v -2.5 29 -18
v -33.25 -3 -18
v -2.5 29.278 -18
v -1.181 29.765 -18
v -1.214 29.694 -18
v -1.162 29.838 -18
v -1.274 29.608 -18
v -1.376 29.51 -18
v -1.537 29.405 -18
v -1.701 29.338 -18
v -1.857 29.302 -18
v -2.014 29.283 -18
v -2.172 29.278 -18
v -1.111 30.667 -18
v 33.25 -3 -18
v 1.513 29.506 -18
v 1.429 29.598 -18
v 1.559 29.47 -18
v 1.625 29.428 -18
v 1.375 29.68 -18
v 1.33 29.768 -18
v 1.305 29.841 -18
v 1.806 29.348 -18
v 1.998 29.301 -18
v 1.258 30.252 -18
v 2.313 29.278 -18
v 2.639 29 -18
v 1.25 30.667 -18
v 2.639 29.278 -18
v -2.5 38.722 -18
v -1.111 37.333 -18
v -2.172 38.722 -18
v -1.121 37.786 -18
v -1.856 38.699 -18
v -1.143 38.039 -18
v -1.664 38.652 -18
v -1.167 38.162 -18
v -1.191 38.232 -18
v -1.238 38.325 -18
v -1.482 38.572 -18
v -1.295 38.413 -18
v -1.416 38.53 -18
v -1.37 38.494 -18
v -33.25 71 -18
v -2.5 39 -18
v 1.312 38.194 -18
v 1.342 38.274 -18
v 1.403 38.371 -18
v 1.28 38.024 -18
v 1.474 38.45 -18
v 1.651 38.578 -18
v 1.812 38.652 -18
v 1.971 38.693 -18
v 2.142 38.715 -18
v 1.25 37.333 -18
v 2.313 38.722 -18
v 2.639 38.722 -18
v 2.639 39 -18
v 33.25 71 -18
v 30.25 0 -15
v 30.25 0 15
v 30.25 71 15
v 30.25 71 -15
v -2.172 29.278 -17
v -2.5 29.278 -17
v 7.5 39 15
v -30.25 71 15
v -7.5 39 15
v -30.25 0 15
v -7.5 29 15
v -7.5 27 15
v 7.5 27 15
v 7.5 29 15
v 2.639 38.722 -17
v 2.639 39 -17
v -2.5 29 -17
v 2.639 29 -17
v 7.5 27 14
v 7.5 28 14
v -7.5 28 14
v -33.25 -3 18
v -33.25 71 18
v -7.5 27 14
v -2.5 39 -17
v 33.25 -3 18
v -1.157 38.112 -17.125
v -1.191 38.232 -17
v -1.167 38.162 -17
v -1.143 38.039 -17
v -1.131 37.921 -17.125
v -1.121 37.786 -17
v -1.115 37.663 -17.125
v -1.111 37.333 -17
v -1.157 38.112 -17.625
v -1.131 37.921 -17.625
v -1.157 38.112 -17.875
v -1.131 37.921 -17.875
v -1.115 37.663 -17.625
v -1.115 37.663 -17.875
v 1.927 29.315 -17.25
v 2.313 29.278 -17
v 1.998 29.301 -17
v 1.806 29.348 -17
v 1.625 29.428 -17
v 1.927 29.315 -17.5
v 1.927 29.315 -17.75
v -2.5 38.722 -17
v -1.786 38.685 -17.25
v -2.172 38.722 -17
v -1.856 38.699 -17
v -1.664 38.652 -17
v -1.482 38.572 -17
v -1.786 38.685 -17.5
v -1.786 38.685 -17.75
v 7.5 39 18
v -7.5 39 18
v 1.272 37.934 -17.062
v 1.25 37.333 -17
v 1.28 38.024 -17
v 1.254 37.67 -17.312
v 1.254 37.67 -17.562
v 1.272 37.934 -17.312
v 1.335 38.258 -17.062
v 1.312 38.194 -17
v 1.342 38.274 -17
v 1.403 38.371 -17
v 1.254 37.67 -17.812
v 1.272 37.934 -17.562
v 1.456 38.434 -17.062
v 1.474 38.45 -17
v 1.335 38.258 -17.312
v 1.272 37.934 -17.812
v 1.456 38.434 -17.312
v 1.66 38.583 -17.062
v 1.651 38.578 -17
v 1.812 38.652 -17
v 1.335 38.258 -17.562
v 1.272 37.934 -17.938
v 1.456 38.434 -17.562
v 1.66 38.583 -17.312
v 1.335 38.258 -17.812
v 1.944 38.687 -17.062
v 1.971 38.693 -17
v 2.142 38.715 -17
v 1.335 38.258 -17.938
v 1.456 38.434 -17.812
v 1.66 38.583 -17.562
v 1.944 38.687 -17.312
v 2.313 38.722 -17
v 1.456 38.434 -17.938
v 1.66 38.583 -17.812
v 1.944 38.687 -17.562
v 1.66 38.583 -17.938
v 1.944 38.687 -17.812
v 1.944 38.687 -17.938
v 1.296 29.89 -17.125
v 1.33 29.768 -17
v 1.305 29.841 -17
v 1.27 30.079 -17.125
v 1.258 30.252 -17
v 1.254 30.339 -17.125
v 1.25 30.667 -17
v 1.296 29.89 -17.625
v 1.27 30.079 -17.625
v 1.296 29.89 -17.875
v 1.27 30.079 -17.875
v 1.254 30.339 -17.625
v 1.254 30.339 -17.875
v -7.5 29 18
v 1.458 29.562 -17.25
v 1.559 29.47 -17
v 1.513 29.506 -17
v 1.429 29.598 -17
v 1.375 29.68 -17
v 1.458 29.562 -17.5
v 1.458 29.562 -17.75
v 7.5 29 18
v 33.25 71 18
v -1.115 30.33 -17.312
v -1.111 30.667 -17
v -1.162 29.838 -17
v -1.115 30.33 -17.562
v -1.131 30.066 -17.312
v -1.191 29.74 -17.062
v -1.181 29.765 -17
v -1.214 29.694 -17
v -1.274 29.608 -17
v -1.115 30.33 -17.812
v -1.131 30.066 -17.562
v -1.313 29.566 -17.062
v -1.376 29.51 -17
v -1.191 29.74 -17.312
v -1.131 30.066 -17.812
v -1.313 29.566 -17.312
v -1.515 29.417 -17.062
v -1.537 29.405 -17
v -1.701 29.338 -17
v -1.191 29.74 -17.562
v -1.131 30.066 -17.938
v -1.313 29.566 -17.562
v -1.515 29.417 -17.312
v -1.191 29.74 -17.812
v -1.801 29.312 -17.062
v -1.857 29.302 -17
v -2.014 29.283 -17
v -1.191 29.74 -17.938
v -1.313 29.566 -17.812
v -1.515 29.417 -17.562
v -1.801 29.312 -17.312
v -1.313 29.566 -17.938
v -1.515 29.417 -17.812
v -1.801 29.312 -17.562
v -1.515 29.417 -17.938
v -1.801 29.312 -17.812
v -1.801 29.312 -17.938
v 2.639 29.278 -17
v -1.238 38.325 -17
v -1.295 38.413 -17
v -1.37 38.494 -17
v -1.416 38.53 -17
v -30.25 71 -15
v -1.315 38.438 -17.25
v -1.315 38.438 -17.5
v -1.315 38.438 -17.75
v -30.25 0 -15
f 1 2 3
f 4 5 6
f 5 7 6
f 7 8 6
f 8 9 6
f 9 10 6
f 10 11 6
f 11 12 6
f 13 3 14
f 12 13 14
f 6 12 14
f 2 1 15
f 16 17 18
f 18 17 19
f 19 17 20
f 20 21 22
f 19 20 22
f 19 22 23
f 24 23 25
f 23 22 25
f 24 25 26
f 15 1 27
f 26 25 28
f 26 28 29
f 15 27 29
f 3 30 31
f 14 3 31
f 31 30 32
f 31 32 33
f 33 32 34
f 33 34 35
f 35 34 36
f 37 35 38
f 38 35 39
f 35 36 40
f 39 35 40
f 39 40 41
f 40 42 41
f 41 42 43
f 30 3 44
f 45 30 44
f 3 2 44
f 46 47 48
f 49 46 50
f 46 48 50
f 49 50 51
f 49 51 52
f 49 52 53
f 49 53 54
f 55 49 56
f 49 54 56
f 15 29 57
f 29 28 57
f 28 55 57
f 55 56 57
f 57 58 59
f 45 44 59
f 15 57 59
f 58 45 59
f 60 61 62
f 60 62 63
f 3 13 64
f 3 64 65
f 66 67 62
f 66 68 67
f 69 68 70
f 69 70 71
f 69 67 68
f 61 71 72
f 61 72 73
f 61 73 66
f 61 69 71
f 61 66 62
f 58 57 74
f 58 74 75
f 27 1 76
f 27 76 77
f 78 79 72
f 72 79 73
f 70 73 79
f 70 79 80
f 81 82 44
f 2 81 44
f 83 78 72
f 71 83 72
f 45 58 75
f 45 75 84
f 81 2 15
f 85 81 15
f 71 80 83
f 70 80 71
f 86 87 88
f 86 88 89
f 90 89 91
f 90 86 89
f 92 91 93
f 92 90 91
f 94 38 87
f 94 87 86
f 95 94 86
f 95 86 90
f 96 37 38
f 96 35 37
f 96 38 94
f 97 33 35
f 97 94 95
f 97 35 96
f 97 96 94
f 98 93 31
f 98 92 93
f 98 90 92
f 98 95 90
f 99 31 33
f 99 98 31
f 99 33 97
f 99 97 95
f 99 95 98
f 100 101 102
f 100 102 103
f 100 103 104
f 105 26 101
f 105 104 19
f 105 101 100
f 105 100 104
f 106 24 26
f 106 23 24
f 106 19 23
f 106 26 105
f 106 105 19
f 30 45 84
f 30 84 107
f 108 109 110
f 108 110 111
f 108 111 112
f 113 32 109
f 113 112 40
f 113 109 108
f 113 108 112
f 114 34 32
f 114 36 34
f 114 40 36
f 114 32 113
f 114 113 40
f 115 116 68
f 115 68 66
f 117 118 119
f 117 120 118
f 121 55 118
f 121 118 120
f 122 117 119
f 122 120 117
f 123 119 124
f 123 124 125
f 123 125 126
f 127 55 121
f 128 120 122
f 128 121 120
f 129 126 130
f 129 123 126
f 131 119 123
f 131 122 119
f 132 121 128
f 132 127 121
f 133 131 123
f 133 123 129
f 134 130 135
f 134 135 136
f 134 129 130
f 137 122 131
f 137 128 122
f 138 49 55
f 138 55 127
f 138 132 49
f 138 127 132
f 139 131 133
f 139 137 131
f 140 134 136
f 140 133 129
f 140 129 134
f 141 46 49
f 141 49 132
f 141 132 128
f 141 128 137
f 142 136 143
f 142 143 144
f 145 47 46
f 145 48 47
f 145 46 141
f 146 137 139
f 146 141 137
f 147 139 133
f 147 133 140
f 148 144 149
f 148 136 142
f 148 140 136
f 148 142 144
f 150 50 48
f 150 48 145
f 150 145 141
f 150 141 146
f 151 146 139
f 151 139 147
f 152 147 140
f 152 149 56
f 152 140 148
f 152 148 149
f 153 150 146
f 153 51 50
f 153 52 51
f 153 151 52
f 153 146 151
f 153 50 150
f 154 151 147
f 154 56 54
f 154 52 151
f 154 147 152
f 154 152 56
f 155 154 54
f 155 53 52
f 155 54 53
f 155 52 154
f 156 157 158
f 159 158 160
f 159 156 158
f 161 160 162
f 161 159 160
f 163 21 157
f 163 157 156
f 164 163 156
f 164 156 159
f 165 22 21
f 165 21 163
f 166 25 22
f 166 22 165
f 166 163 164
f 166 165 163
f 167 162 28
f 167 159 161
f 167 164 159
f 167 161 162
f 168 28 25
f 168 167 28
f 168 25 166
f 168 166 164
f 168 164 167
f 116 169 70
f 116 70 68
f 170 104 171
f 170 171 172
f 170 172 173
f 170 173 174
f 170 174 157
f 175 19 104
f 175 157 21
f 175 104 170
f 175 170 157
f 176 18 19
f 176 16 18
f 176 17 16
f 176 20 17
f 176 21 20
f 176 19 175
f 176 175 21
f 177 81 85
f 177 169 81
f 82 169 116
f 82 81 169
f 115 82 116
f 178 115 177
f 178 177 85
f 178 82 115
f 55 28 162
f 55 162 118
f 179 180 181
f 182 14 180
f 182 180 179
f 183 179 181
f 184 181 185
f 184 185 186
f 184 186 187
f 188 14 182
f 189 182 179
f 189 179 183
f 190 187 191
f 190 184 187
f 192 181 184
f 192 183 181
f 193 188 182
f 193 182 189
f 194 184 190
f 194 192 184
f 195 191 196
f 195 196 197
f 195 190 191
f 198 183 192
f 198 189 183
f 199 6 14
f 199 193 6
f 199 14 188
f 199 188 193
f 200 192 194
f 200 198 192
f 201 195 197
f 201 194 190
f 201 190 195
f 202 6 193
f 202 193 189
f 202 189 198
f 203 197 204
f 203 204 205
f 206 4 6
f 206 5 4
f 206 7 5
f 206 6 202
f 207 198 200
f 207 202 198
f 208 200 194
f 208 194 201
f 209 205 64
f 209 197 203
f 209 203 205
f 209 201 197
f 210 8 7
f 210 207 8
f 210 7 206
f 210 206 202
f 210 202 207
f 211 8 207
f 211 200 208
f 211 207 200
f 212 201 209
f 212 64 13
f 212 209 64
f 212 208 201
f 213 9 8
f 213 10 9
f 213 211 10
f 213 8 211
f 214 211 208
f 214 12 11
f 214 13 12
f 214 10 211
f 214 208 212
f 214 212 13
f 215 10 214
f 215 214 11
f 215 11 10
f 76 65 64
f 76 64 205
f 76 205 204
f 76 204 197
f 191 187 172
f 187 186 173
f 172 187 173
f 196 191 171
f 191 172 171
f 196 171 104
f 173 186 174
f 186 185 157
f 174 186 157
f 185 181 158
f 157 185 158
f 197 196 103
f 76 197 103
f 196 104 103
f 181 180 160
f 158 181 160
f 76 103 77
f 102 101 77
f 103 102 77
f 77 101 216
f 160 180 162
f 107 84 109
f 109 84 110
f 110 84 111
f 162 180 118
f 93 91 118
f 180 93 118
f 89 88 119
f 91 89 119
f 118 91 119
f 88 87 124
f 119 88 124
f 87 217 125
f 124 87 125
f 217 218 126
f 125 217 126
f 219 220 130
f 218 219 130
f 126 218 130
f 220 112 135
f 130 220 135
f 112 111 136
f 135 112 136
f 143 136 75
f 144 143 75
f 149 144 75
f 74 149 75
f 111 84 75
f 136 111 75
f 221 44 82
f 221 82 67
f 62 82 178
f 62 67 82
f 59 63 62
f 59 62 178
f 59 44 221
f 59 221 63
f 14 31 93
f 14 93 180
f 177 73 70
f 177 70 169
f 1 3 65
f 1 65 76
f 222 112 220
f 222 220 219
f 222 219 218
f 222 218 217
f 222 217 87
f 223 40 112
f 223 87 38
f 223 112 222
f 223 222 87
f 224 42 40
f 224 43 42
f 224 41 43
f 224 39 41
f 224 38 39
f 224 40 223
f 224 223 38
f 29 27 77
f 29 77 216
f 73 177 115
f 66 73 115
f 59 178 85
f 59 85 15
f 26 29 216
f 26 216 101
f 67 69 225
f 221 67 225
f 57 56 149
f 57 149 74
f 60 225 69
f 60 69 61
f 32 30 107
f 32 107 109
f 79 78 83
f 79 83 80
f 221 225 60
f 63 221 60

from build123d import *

# Parameters (mm, degrees)
SKETCH1_W           = 66.5
SKETCH1_H           = 36
SKETCH1_W_2         = 60.5
SKETCH1_H_2         = 30
BOSS_EXTRUDE1_DEPTH = 71
SKETCH1_3_W         = 66.5
SKETCH1_3_H         = 36
SKETCH1_3_W_2       = 60.5
SKETCH1_3_H_2       = 30
BOSS_EXTRUDE2_DEPTH = 3
CUT_EXTRUDE1_REACH  = 88.27
SKETCH2_W           = 15
SKETCH2_H           = 10
SKETCH4_W           = 1
SKETCH4_H           = 2
BOSS_EXTRUDE4_DEPTH = 15
CHAMFER1_SIZE       = 1
CUT_EXTRUDE2_DEPTH  = 1


with BuildPart() as part:
    # Sketch1 → Boss-Extrude1 (new body)
    with BuildSketch(Plane(origin=(0, 0, 0), x_dir=(1, 0, 0), z_dir=(0, 1, 0))):
        Rectangle(SKETCH1_W, SKETCH1_H)
        Rectangle(SKETCH1_W_2, SKETCH1_H_2, mode=Mode.SUBTRACT)
    extrude(amount=BOSS_EXTRUDE1_DEPTH)

    # Sketch1<3> → Boss-Extrude2 (add)
    with BuildSketch(Plane(origin=(0, 0, 0), x_dir=(1, 0, 0), z_dir=(0, 1, 0))):
        Rectangle(SKETCH1_3_W, SKETCH1_3_H)
        Rectangle(SKETCH1_3_W_2, SKETCH1_3_H_2, mode=Mode.SUBTRACT)
        Rectangle(SKETCH1_3_W_2, SKETCH1_3_H_2)
    extrude(amount=-BOSS_EXTRUDE2_DEPTH)

    # Sketch2 → Cut-Extrude1 (cut, up to next)
    with BuildSketch(Plane.XY.offset(18), mode=Mode.PRIVATE) as cut_extrude1_sk1:
        with Locations((0, 34)):
            Rectangle(SKETCH2_W, SKETCH2_H)
    cut_extrude1_tool1 = extrude(cut_extrude1_sk1.sketch, amount=-CUT_EXTRUDE1_REACH, mode=Mode.PRIVATE) & part.part
    add(cut_extrude1_tool1.solids().sort_by_distance((0, 34, 18))[0], mode=Mode.SUBTRACT)

    # Sketch4 → Boss-Extrude4 (add)
    with BuildSketch(Plane.ZY.offset(-7.5)):
        with Locations((14.5, 28)):
            Rectangle(SKETCH4_W, SKETCH4_H)
    extrude(amount=BOSS_EXTRUDE4_DEPTH)

    # Chamfer1
    chamfer1_edges = [part.edges().sort_by_distance(p)[0] for p in [
        (0, 29, 14),
    ]]
    chamfer(chamfer1_edges, length=CHAMFER1_SIZE)

    # Sketch5 → Cut-Extrude2 (cut)
    with BuildSketch(Plane(origin=(0, 0, -18), x_dir=(-1, 0, 0), z_dir=(0, 0, -1))):
        with BuildLine():
            Line((-2.638888889, 38.722222222), (-2.638888889, 39))
            Line((-2.638888889, 39), (2.5, 39))
            Line((2.5, 39), (2.5, 38.722222222))
            Line((2.5, 38.722222222), (2.172309028, 38.722222222))
            add(Edge.make_bspline(
                [(2.172309028, 38.722222222), (2.104184293, 38.720949678), (1.974513104, 38.718527469), (1.790231692, 38.689739833), (1.625736646, 38.644148981), (1.528628421, 38.595662221), (1.482204861, 38.572482639)],
                knots=[0, 0, 0, 0, 1.144467932, 2.17842344, 3.129177061, 4, 4, 4, 4], degree=3))
            add(Edge.make_bspline(
                [(1.482204861, 38.572482639), (1.451706337, 38.554084379), (1.390014843, 38.516868933), (1.310783803, 38.438036518), (1.243641581, 38.341940776), (1.209171954, 38.269240619), (1.19140625, 38.231770833)],
                knots=[0, 0, 0, 0, 0.93343552, 1.888125192, 2.911536119, 4, 4, 4, 4], degree=3))
            add(Edge.make_bspline(
                [(1.19140625, 38.231770833), (1.184350586, 38.214575185), (1.16854678, 38.176059078), (1.15557603, 38.106048651), (1.139091299, 38.020392262), (1.129876754, 37.915742203), (1.121221924, 37.794954741), (1.114101268, 37.656759716), (1.113522404, 37.501150705), (1.111942587, 37.391201064), (1.111111111, 37.333333333)],
                knots=[0, 0, 0, 0, 0.491143652, 1.100100526, 1.878201893, 2.802922625, 3.87869145, 5.087223688, 6.466973141, 8, 8, 8, 8], degree=3))
            Line((1.111111111, 37.333333333), (1.111111111, 30.666666667))
            add(Edge.make_bspline(
                [(1.111111111, 30.666666667), (1.111939588, 30.608075204), (1.113524957, 30.495954931), (1.114136618, 30.336734675), (1.121108982, 30.194912102), (1.130079845, 30.070534861), (1.138829557, 29.962956044), (1.156182735, 29.873070769), (1.16828298, 29.799419433), (1.195529243, 29.72563882), (1.240143315, 29.646586055), (1.312990851, 29.562040058), (1.405657276, 29.483796342), (1.517159605, 29.411555124), (1.650210211, 29.350190049), (1.805638269, 29.308289334), (1.981882259, 29.281860539), (2.106374028, 29.279191428), (2.172309028, 29.277777778)],
                knots=[0, 0, 0, 0, 1.353804055, 2.590631371, 3.678090953, 4.633038001, 5.472823534, 6.167945078, 6.748082955, 7.192141313, 7.977799851, 8.831603391, 9.756085287, 10.771283584, 11.893005217, 13.125761034, 14.477707027, 16, 16, 16, 16], degree=3))
            Line((2.172309028, 29.277777778), (2.5, 29.277777778))
            Line((2.5, 29.277777778), (2.5, 29))
            Line((2.5, 29), (-2.638888889, 29))
            Line((-2.638888889, 29), (-2.638888889, 29.277777778))
            Line((-2.638888889, 29.277777778), (-2.313368056, 29.277777778))
            add(Edge.make_bspline(
                [(-2.313368056, 29.277777778), (-2.245251066, 29.279076928), (-2.115594618, 29.281549779), (-1.931900868, 29.309888715), (-1.76838513, 29.356309608), (-1.671870984, 29.404385876), (-1.625434028, 29.427517361)],
                knots=[0, 0, 0, 0, 1.147815573, 2.184795468, 3.126629849, 4, 4, 4, 4], degree=3))
            add(Edge.make_bspline(
                [(-1.625434028, 29.427517361), (-1.594905814, 29.445892719), (-1.533154265, 29.483061837), (-1.454093177, 29.562557374), (-1.38462361, 29.657817078), (-1.348756572, 29.730709883), (-1.330295139, 29.768229167)],
                knots=[0, 0, 0, 0, 0.928829741, 1.878808762, 2.908183361, 4, 4, 4, 4], degree=3))
            add(Edge.make_bspline(
                [(-1.330295139, 29.768229167), (-1.323206914, 29.785418433), (-1.307060225, 29.82457489), (-1.295055162, 29.894793912), (-1.277647574, 29.980267632), (-1.268863248, 30.084275321), (-1.26000169, 30.205758881), (-1.253094282, 30.343969196), (-1.252369885, 30.49957111), (-1.250820734, 30.60879845), (-1.25, 30.666666667)],
                knots=[0, 0, 0, 0, 0.491154816, 1.118830903, 1.878082211, 2.802823963, 3.878617243, 5.106317376, 6.466938293, 8, 8, 8, 8], degree=3))
            Line((-1.25, 30.666666667), (-1.25, 37.333333333))
            add(Edge.make_bspline(
                [(-1.25, 37.333333333), (-1.250801761, 37.391926604), (-1.252336008, 37.504050339), (-1.253291766, 37.663247301), (-1.259177025, 37.805200537), (-1.271446326, 37.928690427), (-1.280582203, 38.036174276), (-1.295723919, 38.125982088), (-1.312405424, 38.198748616), (-1.338621653, 38.273308229), (-1.385613233, 38.351596892), (-1.455981361, 38.439521903), (-1.551157589, 38.515346585), (-1.661938741, 38.588028597), (-1.793960563, 38.650297433), (-1.948902922, 38.691613339), (-2.12438389, 38.71806089), (-2.248154932, 38.720786263), (-2.313368056, 38.722222222)],
                knots=[0, 0, 0, 0, 1.355372936, 2.593633572, 3.682353377, 4.639723862, 5.46383559, 6.176261324, 6.744401302, 7.188974265, 7.998347102, 8.842429006, 9.78074911, 10.797123889, 11.904961153, 13.139145573, 14.492658294, 16, 16, 16, 16], degree=3))
            Line((-2.313368056, 38.722222222), (-2.638888889, 38.722222222))
        make_face()
    extrude(amount=-CUT_EXTRUDE2_DEPTH, mode=Mode.SUBTRACT)


solid = part.part
